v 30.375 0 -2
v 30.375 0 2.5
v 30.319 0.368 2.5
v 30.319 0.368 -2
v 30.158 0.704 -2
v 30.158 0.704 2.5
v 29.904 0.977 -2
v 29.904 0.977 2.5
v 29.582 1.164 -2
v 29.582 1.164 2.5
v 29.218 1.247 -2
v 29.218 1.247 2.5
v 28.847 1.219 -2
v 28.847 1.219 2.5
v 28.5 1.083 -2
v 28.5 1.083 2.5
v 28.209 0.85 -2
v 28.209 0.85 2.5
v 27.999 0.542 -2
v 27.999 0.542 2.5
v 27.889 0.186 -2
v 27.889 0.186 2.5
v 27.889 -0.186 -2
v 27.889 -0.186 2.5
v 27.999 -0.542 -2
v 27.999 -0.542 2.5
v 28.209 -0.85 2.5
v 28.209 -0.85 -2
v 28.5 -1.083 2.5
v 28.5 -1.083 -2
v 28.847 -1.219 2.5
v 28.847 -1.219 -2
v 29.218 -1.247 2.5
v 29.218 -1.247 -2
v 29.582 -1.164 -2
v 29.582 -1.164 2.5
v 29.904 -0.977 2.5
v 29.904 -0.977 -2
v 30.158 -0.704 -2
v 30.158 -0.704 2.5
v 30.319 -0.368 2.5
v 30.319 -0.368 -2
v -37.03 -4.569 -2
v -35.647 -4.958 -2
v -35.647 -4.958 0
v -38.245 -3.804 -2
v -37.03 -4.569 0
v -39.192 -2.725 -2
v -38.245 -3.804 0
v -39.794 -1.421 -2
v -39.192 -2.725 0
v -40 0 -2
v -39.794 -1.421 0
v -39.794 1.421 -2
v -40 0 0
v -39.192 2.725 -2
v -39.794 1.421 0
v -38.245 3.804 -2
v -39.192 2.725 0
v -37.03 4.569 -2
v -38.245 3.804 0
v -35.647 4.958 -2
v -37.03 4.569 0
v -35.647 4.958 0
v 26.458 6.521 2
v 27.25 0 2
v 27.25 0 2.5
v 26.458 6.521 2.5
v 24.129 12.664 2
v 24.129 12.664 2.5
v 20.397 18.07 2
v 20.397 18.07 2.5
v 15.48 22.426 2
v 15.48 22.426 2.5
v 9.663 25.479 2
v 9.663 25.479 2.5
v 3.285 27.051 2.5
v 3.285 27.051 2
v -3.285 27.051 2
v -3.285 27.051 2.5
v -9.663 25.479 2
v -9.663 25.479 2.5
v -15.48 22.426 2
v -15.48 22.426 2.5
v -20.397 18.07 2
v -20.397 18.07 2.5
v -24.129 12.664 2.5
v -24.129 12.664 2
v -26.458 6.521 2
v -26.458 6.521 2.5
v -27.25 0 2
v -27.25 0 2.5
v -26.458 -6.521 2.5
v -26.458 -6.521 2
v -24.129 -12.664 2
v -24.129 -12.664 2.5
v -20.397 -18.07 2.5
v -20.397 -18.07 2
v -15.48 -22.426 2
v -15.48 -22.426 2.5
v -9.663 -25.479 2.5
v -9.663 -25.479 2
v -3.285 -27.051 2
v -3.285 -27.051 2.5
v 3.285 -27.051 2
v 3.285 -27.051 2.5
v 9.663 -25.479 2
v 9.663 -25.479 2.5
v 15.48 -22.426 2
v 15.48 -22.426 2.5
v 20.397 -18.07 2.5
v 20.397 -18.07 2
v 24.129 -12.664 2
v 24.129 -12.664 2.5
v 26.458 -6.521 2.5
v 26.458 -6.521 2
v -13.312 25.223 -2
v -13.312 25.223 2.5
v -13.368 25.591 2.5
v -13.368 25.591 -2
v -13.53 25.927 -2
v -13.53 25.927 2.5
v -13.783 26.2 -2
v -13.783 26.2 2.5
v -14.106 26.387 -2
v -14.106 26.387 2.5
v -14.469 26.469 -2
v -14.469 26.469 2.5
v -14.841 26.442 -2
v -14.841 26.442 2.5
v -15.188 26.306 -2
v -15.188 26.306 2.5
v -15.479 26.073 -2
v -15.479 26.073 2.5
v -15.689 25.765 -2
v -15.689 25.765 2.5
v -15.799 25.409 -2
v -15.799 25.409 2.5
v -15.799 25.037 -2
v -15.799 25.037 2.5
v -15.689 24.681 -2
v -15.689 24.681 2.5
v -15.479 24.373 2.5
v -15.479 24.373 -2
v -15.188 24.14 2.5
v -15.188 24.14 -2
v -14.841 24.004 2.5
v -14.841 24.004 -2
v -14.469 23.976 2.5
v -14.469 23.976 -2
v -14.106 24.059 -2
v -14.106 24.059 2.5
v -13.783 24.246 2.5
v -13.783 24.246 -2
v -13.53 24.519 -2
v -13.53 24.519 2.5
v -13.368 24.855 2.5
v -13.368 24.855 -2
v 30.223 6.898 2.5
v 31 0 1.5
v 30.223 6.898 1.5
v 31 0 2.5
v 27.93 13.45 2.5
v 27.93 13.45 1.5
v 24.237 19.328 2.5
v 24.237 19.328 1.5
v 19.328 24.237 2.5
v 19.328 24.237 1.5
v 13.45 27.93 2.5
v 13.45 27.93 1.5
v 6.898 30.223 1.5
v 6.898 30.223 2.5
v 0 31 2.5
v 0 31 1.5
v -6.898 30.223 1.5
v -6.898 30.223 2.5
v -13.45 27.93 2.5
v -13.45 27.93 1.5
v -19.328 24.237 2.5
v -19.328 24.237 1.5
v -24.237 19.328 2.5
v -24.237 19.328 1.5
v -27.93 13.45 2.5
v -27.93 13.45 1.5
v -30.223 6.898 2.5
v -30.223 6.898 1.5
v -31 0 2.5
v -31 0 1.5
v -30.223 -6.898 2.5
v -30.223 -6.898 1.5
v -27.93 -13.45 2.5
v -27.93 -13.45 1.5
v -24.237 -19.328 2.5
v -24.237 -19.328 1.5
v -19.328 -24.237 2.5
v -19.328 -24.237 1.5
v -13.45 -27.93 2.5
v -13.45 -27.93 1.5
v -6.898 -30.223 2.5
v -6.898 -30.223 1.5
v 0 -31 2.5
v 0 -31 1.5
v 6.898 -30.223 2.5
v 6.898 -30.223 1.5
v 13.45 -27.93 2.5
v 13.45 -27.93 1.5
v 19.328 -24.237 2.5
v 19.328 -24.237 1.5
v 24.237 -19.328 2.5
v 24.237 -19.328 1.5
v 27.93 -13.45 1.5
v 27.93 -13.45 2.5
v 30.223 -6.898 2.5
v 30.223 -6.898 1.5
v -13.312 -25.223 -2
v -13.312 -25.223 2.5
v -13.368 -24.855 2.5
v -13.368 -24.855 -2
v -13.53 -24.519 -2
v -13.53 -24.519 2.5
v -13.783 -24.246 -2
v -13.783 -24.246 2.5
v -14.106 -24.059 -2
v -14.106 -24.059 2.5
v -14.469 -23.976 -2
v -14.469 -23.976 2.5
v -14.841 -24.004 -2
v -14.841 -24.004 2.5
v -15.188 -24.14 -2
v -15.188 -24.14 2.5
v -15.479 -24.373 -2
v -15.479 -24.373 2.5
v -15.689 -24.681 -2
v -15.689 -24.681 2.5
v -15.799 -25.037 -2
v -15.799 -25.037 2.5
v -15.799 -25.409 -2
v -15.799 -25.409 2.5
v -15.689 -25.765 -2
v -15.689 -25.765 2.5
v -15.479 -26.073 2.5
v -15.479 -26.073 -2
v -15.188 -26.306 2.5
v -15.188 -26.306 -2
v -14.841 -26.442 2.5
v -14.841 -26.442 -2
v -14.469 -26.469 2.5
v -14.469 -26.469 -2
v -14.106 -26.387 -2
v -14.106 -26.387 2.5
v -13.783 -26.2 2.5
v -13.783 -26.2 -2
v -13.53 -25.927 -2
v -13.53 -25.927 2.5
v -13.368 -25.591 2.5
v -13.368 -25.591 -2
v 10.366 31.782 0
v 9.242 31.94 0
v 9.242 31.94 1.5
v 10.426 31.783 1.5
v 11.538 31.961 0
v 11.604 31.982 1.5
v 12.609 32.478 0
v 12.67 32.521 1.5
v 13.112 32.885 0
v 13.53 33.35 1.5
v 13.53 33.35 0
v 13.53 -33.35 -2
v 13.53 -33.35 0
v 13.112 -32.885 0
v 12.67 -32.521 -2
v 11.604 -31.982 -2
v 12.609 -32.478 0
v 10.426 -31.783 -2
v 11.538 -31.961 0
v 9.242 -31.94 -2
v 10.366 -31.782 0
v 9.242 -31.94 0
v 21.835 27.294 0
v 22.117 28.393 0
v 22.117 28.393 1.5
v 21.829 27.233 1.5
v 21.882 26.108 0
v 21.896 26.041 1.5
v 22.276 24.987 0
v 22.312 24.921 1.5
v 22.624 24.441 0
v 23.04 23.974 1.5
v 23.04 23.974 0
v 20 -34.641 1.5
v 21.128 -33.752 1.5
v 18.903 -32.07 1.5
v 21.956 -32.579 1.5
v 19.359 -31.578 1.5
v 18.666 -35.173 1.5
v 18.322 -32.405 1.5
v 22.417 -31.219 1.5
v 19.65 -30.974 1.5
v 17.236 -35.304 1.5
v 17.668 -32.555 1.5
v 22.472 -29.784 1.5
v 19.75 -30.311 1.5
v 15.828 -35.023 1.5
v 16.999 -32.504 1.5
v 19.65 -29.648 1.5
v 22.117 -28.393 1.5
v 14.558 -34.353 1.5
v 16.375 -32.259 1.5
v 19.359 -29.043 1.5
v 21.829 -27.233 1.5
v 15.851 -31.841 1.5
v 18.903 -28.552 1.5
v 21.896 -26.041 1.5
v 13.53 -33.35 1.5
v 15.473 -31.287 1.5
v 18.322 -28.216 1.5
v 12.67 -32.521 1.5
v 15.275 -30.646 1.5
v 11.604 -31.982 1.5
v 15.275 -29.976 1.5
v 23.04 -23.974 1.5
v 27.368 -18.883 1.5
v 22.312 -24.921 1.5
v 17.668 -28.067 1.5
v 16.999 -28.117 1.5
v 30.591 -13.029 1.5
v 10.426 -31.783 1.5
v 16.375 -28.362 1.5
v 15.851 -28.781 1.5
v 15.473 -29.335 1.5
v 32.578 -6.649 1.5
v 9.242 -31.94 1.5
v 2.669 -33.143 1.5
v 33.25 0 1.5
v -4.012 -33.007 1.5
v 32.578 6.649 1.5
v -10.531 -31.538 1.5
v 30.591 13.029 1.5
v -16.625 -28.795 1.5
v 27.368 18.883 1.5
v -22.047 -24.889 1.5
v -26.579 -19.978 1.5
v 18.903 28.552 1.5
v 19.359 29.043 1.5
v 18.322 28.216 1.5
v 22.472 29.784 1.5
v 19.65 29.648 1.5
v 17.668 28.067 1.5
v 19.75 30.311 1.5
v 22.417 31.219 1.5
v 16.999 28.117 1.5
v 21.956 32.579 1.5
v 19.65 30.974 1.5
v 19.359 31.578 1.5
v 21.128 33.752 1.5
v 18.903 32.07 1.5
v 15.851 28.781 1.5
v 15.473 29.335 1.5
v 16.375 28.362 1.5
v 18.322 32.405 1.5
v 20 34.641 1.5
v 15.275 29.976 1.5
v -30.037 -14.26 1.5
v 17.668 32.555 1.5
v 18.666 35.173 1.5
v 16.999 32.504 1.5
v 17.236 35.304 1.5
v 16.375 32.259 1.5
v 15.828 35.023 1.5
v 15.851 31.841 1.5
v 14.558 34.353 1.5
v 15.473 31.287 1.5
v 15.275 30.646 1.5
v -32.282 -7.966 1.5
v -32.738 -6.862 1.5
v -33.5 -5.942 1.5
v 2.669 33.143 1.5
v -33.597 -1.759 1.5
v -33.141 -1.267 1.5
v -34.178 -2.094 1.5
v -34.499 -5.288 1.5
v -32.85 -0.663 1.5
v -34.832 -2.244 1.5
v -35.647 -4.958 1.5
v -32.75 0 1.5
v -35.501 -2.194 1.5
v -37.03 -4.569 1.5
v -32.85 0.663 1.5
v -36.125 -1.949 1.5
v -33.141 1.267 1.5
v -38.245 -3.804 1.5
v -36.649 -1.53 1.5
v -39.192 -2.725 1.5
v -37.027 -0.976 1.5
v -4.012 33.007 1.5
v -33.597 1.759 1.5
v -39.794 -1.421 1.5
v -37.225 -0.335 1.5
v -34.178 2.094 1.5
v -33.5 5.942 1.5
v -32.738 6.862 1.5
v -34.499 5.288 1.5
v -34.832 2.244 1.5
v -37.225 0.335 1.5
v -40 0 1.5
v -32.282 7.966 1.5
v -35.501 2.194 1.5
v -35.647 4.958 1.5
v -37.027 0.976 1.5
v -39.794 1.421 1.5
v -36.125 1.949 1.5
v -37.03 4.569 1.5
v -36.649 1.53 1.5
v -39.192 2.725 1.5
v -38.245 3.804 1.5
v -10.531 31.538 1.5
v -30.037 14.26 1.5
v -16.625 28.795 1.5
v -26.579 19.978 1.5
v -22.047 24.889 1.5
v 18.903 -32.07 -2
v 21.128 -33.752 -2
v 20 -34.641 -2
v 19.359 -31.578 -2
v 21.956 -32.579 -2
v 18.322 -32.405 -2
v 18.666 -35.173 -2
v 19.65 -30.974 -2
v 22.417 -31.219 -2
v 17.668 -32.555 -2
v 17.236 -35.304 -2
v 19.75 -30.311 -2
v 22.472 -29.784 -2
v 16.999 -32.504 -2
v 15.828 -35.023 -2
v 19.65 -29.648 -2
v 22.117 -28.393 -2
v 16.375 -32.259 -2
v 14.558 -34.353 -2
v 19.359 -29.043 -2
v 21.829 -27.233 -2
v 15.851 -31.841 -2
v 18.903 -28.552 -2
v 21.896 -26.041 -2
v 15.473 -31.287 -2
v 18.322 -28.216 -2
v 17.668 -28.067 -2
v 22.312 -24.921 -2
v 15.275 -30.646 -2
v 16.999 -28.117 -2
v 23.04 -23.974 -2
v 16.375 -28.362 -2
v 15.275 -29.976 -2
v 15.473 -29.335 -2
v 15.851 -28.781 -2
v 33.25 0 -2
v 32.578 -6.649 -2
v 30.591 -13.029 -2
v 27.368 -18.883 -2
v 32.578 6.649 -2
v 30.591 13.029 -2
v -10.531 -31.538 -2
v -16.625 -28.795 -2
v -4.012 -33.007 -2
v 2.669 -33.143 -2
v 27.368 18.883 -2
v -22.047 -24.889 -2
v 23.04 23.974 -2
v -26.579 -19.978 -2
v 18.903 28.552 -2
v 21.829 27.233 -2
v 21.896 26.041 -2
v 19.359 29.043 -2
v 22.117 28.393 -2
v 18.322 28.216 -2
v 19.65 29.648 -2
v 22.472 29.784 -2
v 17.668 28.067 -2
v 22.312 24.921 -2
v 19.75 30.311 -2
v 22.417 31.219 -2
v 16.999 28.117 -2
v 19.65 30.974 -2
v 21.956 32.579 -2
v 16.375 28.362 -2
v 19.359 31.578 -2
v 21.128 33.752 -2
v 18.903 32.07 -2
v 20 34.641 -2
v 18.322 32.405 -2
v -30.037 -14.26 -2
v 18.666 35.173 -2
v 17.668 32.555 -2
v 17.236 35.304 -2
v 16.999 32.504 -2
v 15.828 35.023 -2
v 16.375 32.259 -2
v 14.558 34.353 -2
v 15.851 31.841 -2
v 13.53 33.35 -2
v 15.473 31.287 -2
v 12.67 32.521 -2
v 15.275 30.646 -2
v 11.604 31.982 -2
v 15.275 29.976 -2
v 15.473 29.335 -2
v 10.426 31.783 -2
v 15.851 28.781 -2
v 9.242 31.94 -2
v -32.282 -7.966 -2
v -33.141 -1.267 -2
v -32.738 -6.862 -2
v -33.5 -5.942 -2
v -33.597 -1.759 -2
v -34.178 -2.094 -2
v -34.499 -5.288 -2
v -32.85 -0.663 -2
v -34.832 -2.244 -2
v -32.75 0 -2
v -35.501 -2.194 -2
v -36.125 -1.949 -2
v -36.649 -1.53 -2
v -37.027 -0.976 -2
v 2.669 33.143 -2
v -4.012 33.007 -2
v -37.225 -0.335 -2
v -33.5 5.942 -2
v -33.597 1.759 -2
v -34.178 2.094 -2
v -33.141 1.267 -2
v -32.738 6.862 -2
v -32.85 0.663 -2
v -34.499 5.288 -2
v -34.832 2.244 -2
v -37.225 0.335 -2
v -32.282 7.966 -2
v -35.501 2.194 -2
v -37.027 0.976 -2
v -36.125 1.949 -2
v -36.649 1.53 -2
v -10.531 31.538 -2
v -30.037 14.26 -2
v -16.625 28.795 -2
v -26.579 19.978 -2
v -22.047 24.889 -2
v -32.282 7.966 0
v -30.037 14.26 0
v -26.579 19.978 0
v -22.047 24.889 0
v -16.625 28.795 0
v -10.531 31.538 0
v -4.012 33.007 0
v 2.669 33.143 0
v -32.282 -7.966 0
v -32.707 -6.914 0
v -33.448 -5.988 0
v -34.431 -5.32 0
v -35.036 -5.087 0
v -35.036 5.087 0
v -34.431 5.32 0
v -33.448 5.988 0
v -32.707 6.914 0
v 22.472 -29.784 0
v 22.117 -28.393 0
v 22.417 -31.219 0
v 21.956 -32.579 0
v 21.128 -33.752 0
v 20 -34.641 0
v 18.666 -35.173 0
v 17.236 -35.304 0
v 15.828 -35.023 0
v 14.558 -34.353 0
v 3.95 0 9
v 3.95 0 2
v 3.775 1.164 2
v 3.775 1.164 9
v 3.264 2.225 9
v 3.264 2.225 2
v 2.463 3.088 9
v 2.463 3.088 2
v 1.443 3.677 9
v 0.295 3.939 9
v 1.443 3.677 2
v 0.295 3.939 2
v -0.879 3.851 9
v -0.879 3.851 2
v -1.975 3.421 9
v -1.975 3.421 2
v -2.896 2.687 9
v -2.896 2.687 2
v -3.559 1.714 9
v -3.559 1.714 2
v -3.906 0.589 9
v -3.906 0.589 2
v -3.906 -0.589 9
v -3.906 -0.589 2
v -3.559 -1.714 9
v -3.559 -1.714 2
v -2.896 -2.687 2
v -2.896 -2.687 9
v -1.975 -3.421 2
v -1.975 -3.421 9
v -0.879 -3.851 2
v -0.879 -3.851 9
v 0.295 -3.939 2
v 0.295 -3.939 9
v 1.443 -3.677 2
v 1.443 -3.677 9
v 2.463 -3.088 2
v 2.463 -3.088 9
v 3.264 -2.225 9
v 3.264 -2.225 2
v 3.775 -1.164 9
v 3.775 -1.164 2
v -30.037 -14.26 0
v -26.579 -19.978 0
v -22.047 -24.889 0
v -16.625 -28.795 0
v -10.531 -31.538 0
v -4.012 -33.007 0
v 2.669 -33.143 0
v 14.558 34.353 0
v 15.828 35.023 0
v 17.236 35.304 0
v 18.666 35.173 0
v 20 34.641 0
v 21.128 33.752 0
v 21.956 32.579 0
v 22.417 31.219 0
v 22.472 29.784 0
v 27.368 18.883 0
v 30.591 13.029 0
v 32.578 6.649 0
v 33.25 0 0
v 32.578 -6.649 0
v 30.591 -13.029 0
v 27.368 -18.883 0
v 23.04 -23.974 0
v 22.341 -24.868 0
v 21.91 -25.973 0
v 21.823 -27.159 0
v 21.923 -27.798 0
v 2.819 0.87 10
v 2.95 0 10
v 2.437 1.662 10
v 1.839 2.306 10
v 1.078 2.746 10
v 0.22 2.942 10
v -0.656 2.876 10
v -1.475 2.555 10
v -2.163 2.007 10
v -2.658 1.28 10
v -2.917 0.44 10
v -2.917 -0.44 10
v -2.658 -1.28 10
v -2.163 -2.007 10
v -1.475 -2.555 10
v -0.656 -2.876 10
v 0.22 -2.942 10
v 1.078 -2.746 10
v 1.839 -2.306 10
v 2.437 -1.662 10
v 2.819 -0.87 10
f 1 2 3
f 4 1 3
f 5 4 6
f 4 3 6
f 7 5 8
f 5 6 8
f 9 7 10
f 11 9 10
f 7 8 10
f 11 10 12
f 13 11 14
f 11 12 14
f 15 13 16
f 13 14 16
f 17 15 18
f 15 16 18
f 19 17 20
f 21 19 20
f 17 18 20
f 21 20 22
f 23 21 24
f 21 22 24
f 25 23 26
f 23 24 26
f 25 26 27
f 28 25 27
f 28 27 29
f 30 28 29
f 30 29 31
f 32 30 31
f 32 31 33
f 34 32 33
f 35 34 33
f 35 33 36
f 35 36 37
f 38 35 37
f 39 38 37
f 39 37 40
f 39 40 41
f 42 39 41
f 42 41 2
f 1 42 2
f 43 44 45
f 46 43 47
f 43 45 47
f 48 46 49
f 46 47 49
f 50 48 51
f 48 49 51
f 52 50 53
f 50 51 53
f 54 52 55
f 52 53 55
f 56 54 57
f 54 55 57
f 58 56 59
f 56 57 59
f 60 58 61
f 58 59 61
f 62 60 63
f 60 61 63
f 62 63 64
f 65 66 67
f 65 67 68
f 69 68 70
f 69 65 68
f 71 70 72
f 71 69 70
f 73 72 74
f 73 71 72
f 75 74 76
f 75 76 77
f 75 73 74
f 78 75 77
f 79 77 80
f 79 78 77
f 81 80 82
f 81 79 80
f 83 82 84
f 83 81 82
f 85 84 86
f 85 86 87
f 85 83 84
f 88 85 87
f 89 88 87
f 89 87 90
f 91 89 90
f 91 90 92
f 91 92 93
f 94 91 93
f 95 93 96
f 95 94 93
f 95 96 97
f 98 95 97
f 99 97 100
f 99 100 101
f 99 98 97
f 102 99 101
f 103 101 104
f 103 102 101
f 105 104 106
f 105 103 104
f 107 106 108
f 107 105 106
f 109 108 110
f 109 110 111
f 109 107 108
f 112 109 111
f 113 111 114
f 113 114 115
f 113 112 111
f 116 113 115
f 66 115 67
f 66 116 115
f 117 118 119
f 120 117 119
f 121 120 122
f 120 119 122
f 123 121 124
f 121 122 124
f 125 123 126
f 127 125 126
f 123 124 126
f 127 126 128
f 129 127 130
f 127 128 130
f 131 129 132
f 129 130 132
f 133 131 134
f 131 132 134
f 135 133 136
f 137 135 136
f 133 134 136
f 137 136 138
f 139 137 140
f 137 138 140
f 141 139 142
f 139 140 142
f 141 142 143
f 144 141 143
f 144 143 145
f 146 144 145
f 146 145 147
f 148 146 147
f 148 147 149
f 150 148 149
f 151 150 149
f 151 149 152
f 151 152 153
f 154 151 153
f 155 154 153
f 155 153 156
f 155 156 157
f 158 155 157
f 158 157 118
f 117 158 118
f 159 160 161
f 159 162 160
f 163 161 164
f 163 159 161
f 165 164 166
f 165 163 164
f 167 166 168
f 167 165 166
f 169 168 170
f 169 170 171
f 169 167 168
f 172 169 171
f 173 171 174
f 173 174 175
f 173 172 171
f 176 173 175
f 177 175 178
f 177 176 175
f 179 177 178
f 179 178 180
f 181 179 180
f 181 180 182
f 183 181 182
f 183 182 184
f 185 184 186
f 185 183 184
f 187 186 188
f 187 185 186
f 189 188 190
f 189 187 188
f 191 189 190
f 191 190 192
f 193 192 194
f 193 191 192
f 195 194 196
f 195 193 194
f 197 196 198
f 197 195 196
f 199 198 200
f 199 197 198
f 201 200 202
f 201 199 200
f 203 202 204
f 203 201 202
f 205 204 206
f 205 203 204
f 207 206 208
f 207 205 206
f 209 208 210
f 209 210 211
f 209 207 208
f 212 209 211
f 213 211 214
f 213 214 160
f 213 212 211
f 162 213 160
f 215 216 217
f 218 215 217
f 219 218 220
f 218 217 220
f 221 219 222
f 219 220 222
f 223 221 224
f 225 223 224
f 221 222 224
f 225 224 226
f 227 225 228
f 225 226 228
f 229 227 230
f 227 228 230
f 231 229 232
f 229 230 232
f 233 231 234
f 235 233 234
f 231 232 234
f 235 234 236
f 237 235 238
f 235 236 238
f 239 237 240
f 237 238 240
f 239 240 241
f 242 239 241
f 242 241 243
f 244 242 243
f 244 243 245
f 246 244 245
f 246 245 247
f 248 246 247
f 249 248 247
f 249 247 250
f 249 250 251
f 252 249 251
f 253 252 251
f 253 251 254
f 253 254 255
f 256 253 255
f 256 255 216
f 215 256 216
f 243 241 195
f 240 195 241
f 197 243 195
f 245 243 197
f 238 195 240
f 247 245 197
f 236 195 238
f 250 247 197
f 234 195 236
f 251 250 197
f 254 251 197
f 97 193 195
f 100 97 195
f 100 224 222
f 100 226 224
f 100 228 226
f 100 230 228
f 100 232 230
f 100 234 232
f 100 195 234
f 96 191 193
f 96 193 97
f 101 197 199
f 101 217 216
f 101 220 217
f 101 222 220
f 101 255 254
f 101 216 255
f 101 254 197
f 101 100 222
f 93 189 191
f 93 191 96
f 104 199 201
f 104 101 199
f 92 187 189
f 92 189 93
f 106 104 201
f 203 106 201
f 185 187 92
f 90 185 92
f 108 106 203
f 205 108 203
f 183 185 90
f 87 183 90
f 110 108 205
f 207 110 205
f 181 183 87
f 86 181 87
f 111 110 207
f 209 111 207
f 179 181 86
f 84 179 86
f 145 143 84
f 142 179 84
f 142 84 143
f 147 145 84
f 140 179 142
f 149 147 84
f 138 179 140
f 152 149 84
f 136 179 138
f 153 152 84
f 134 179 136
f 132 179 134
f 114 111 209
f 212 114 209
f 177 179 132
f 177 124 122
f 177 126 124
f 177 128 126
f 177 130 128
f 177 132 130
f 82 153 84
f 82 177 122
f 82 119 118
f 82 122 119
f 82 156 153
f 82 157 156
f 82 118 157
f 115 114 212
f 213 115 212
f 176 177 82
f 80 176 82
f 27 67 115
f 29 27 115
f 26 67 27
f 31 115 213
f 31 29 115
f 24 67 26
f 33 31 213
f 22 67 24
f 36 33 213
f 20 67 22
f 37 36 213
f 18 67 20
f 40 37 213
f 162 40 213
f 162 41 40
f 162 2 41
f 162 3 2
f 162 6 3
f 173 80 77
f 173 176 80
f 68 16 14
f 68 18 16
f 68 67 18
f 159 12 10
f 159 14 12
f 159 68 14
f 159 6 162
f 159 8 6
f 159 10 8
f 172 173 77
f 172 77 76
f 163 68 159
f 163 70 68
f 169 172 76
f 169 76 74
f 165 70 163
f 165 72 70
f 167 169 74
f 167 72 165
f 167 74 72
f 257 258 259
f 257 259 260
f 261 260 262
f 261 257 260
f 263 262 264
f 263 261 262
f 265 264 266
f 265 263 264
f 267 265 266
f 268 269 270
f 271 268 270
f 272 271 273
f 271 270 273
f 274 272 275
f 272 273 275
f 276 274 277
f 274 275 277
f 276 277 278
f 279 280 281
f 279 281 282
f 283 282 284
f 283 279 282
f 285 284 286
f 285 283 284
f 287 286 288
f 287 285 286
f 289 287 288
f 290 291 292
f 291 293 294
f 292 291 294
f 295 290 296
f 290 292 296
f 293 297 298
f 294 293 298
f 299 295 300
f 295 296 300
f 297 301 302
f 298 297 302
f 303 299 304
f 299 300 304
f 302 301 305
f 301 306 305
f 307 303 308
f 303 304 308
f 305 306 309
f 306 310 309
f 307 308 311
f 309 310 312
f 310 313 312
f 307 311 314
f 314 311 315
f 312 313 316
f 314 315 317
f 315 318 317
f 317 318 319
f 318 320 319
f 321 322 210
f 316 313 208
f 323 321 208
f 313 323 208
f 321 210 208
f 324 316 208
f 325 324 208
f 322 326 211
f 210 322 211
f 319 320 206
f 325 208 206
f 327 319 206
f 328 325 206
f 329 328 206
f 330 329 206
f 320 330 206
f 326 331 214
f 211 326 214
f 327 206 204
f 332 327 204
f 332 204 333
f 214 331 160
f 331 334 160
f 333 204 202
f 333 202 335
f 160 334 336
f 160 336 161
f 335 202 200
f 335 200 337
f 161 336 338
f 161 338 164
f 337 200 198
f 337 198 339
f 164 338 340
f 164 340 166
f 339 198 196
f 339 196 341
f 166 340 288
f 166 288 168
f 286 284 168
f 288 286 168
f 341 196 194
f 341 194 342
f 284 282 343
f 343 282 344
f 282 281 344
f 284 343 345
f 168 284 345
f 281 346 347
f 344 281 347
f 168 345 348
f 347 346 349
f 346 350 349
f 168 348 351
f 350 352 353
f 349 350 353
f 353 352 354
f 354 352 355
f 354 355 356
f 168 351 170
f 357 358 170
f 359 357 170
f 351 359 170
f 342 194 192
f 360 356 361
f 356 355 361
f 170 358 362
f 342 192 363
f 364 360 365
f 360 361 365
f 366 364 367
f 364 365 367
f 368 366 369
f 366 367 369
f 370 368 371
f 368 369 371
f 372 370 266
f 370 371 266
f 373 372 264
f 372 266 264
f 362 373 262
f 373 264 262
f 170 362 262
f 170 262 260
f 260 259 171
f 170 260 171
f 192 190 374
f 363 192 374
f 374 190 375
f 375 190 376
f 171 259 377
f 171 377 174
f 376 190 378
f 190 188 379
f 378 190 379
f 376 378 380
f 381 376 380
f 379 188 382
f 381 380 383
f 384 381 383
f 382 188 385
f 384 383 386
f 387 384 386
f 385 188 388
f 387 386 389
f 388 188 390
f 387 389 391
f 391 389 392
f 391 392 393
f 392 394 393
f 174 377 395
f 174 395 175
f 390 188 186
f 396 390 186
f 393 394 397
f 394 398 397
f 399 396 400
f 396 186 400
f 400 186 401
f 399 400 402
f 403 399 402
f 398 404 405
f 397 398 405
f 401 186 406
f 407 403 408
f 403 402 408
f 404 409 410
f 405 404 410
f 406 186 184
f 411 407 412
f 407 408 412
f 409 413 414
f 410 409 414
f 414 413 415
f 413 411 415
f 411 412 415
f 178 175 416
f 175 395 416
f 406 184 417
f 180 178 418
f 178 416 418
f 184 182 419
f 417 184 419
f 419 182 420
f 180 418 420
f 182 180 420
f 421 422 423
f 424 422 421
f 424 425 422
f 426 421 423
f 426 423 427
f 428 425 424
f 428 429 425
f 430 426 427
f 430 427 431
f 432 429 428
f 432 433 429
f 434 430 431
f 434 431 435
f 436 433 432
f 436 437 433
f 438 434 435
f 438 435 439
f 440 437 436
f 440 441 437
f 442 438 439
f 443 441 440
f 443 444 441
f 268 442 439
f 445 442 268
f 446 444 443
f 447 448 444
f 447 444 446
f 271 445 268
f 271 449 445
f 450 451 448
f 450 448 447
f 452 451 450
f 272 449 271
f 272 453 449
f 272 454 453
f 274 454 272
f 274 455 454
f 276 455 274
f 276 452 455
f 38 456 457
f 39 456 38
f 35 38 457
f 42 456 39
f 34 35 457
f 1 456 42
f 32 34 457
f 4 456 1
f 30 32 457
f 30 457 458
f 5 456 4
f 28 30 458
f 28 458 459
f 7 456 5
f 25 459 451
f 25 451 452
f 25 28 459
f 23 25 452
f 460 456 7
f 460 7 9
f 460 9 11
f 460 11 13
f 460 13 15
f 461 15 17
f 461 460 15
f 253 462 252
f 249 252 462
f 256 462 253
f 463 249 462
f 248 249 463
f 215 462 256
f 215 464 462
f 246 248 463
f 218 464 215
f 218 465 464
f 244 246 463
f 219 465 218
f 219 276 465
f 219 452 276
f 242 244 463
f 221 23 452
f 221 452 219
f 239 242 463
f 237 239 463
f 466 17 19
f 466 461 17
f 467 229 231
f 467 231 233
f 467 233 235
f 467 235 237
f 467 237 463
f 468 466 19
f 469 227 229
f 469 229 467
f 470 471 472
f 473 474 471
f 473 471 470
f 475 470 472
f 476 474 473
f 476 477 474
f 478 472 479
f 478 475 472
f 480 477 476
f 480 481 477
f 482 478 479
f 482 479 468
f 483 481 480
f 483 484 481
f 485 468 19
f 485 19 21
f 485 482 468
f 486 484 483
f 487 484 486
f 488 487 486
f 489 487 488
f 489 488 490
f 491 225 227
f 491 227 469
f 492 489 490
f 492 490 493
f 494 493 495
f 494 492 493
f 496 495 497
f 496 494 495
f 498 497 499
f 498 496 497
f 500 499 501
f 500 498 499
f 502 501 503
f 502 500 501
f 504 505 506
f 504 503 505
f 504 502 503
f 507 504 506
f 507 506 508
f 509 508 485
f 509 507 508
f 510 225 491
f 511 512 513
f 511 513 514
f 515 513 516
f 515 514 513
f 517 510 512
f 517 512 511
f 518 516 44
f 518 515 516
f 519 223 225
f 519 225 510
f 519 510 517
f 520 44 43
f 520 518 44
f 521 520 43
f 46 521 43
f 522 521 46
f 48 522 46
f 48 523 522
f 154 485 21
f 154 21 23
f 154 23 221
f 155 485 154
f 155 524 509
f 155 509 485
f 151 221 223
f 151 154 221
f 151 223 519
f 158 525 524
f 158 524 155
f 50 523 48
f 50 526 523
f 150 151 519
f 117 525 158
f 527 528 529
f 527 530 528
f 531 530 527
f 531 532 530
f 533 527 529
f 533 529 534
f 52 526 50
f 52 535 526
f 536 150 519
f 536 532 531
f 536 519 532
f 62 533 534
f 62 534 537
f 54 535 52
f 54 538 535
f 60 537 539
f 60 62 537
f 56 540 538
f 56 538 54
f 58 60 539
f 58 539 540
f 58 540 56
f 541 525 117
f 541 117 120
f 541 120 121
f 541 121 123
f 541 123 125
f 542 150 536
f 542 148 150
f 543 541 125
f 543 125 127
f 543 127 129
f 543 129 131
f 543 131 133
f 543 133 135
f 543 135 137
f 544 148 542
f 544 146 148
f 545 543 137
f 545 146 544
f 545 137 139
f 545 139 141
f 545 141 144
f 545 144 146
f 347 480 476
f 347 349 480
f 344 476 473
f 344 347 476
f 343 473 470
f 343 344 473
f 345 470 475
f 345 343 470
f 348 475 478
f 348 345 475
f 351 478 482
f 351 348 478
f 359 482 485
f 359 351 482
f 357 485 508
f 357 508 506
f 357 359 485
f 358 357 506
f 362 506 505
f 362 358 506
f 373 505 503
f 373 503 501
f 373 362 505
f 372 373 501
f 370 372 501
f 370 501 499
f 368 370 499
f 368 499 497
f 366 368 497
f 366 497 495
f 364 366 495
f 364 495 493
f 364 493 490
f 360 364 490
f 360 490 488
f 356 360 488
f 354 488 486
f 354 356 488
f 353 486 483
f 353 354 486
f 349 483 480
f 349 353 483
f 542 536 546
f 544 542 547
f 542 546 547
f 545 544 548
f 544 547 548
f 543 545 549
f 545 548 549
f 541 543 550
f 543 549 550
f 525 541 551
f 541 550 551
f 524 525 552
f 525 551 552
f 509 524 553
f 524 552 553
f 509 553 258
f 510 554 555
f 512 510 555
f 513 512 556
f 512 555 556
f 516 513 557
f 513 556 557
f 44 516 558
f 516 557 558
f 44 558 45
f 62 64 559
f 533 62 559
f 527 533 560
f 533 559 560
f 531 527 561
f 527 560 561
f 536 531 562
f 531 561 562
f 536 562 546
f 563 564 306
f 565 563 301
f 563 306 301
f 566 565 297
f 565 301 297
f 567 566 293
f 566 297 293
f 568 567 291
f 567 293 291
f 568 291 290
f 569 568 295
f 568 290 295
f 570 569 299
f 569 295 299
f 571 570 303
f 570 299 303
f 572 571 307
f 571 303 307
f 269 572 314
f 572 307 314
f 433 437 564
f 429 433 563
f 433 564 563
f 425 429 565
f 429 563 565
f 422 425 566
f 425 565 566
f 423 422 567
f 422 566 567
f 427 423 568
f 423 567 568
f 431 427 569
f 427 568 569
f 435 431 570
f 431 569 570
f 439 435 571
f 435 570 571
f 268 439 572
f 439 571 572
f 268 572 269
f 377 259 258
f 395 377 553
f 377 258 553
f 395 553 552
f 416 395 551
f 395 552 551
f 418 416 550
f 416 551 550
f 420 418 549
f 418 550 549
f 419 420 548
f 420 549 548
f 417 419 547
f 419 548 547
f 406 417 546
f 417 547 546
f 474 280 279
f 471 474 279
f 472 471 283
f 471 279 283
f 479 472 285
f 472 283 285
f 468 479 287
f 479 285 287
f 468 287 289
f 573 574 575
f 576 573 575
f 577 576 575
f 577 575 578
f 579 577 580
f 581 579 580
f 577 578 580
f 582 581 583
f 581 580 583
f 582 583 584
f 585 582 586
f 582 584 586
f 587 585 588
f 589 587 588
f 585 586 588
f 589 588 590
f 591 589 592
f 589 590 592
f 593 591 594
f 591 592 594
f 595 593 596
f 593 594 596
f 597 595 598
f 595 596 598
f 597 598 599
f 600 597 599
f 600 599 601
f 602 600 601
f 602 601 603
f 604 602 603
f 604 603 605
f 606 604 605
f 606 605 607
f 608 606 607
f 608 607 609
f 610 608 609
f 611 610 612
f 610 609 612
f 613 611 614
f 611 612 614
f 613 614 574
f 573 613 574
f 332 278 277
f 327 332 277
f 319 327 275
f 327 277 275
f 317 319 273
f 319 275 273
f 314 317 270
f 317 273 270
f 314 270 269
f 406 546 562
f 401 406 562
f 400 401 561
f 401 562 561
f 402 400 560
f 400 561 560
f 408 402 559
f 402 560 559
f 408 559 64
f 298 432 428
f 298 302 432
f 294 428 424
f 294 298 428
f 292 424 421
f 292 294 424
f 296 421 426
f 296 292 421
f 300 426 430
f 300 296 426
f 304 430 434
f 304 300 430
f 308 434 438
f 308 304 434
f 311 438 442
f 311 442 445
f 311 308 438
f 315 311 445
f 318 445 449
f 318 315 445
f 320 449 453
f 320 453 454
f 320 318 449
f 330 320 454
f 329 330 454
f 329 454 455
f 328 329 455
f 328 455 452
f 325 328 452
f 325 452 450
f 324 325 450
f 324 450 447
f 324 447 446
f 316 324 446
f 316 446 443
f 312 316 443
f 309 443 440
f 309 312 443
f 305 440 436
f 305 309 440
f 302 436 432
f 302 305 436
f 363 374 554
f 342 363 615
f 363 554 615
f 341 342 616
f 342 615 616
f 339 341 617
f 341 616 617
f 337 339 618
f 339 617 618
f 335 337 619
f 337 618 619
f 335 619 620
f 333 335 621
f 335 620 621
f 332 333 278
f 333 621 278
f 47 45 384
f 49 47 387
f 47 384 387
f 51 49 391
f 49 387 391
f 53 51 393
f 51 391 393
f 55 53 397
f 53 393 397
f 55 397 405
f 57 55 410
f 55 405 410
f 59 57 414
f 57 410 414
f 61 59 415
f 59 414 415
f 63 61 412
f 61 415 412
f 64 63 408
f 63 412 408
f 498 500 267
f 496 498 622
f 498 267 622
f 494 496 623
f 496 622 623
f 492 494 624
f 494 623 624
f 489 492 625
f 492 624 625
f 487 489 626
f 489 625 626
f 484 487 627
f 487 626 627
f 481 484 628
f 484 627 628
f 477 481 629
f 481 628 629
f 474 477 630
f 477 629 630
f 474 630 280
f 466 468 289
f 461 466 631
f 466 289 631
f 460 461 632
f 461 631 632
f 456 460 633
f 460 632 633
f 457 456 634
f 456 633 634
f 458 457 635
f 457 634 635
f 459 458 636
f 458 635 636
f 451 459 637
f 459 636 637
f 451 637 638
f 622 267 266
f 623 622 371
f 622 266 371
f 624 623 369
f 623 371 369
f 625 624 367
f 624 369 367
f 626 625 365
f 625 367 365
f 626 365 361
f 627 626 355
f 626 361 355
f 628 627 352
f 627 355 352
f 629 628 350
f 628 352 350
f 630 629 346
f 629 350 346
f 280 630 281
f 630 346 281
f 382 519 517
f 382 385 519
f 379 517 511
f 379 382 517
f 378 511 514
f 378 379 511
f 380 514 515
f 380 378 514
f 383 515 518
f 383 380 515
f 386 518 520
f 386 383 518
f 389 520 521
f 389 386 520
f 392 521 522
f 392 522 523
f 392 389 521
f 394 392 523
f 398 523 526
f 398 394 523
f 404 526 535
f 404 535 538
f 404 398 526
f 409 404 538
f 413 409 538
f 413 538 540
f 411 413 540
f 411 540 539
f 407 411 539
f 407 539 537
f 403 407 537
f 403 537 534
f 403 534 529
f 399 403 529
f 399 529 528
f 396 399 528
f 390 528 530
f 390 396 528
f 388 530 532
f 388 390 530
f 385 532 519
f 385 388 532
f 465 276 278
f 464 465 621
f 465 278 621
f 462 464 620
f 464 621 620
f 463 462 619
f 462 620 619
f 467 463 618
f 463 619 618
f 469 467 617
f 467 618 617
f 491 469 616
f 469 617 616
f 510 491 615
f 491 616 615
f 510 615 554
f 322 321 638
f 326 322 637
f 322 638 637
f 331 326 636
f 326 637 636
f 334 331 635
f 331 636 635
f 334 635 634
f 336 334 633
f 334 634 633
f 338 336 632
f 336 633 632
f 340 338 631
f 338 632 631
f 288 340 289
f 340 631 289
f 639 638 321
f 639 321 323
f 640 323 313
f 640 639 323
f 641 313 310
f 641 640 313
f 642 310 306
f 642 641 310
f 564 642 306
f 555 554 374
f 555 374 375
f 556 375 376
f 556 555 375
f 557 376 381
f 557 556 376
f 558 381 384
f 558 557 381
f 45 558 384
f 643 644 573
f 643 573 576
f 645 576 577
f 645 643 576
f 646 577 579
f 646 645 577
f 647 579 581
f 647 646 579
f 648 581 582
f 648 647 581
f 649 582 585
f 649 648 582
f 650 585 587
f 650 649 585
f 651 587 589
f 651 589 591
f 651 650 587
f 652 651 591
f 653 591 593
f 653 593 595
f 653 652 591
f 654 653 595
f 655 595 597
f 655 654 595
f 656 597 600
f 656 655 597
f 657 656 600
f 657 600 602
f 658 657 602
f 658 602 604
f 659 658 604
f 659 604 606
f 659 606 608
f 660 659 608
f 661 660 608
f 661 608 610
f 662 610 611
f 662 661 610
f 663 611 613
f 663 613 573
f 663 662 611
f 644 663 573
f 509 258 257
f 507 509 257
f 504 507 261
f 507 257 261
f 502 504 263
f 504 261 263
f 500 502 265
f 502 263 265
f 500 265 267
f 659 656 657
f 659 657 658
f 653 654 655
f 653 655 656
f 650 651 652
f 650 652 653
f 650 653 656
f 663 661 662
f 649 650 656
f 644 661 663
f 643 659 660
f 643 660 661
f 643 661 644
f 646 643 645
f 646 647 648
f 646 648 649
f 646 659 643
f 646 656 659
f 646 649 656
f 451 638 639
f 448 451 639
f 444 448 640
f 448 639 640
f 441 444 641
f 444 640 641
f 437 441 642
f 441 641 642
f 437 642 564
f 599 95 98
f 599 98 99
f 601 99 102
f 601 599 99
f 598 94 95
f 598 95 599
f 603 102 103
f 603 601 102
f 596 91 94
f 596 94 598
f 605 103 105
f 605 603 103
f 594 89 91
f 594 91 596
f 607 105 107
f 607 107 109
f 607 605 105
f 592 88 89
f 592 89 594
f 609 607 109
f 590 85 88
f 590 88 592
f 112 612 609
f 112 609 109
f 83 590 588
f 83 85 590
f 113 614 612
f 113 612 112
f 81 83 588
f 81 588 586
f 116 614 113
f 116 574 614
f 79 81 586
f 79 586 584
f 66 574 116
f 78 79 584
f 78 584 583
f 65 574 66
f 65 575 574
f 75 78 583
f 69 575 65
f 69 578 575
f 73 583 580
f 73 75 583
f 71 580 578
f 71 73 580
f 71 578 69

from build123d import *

# Parameters (mm, degrees)
ESQUISSE1_R                        = 31.25
BOSS_EXTRU_1_DEPTH                 = 2
BOSS_EXTRU_2_DEPTH                 = 25.5
BOSS_EXTRU_2_DEPTH_BACK            = 2
ESQUISSE2_R                        = 33.25
ESQUISSE2_R_2                      = 31.25
ESQUISSE3_R                        = 7.95
BOSS_EXTRU_3_DEPTH                 = 7.5
ESQUISSE4_R                        = 3.95
BOSS_EXTRU_4_DEPTH                 = 8
CHANFREIN1_SIZE                    = 1
BOSS_EXTRU_5_DEPTH                 = 27.5
ESQUISSE6_R                        = 1.75
ENL_V_MAT_EXTRU_1_DEPTH            = 10
CONG_1_R                           = 4
R_P_TITION_CIRCULAIRE2_COUNT       = 3
CONG_1_OF_R_P_TITION_CIRCULAIRE2_R = 4
ENL_V_MAT_EXTRU_2_DEPTH            = 25.5
ESQUISSE8_R                        = 3.95
BOSS_EXTRU_6_DEPTH                 = 8
ESQUISSE9_R                        = 2.25
ENL_V_MAT_EXTRU_3_DEPTH            = 54.952376281
CHANFREIN2_SIZE                    = 1
ESQUISSE10_R                       = 31
ESQUISSE10_R_2                     = 27.25
BOSS_EXTRU_7_DEPTH                 = 0.5
ESQUISSE11_R                       = 31
ENL_V_MAT_EXTRU_4_DEPTH            = 0.5
ESQUISSE12_R                       = 2.25
BOSS_EXTRU_8_DEPTH                 = 2
ESQUISSE13_R                       = 1.25
ENL_V_MAT_EXTRU_5_DEPTH            = 54.88050581


with BuildPart() as part:
    # Esquisse1 → Boss.-Extru.1 (new body)
    with BuildSketch(Plane.XY):
        Circle(ESQUISSE1_R)
    extrude(amount=BOSS_EXTRU_1_DEPTH)

    # Esquisse2 → Boss.-Extru.2 (add, two sides: drawn at the far end of the back side and taken through both)
    with BuildSketch(Plane.XY.offset(2).offset(-BOSS_EXTRU_2_DEPTH_BACK)):
        Circle(ESQUISSE2_R)
        Circle(ESQUISSE2_R_2, mode=Mode.SUBTRACT)
    extrude(amount=BOSS_EXTRU_2_DEPTH + BOSS_EXTRU_2_DEPTH_BACK)

    # Esquisse3 → Boss.-Extru.3 (add)
    with BuildSketch(Plane.XY.offset(2)):
        Circle(ESQUISSE3_R)
    extrude(amount=BOSS_EXTRU_3_DEPTH)

    # Esquisse4 → Boss.-Extru.4 (add)
    with BuildSketch(Plane.XY.offset(9.5)):
        Circle(ESQUISSE4_R)
    extrude(amount=BOSS_EXTRU_4_DEPTH)

    # Chanfrein1
    chanfrein1_edges = [part.edges().sort_by_distance(p)[0] for p in [
        (-7.95, 0, 9.5),
        (-3.95, 0, 17.5),
    ]]
    chamfer(chanfrein1_edges, length=CHANFREIN1_SIZE)

    # Esquisse5 → Boss.-Extru.5 (add)
    with BuildSketch(Plane.XY.offset(27.5)):
        with BuildLine():
            ThreePointArc((-32.936607143, -4.554383594), (-40, 0), (-32.936607143, 4.554383594))
            ThreePointArc((-32.936607143, 4.554383594), (-33.25, 0), (-32.936607143, -4.554383594))
        make_face()
    boss_extru_5 = extrude(amount=-BOSS_EXTRU_5_DEPTH)

    # Esquisse6 → Enlèv. mat.-Extru.1 (cut)
    with BuildSketch(Plane.XY.offset(27.5)):
        with Locations((-35, 0)):
            Circle(ESQUISSE6_R)
    enl_v_mat_extru_1 = extrude(amount=-ENL_V_MAT_EXTRU_1_DEPTH, mode=Mode.SUBTRACT)

    # Congé1
    cong_1_edges = [part.edges().sort_by_distance(p)[0] for p in [
        (-32.936607143, 4.554383594, 13.75),
        (-32.936607143, -4.554383594, 13.75),
    ]]
    fillet(cong_1_edges, radius=CONG_1_R)

    # Répétition circulaire2: Boss.-Extru.5, Enlèv. mat.-Extru.1 ×3 about axis
    r_p_tition_circulaire2_axis = Axis((0, 0, 0), (0, 0, 1))
    add([boss_extru_5.rotate(r_p_tition_circulaire2_axis, i * 360 / R_P_TITION_CIRCULAIRE2_COUNT) for i in range(1, R_P_TITION_CIRCULAIRE2_COUNT)])
    add([enl_v_mat_extru_1.rotate(r_p_tition_circulaire2_axis, i * 360 / R_P_TITION_CIRCULAIRE2_COUNT) for i in range(1, R_P_TITION_CIRCULAIRE2_COUNT)], mode=Mode.SUBTRACT)

    # Congé1 of Répétition circulaire2
    cong_1_of_r_p_tition_circulaire2_edges = [part.edges().sort_by_distance(p)[0] for p in [
        (12.524091681, -30.801130297, 13.75),
        (20.412515462, -26.246746703, 13.75),
        (20.412515462, 26.246746703, 13.75),
        (12.524091681, 30.801130297, 13.75),
    ]]
    fillet(cong_1_of_r_p_tition_circulaire2_edges, radius=CONG_1_OF_R_P_TITION_CIRCULAIRE2_R)

    # Esquisse7 → Enlèv. mat.-Extru.2 (cut)
    with BuildSketch(Plane.XY.offset(27.5)):
        with BuildLine():
            ThreePointArc((-35.647321429, 4.957920428), (-40, 0), (-35.647321429, -4.957920428))
            ThreePointArc((-35.647321429, -4.957920428), (-33.49964623, -5.941818617), (-32.281669463, -7.965947318))
            ThreePointArc((-32.281669463, -7.965947318), (-16.625, -28.795344676), (9.242121989, -31.939719491))
            ThreePointArc((9.242121989, -31.939719491), (11.604057248, -31.982453961), (13.529975674, -33.350446148))
            ThreePointArc((13.529975674, -33.350446148), (20, -34.641016151), (22.117345755, -28.39252572))
            ThreePointArc((22.117345755, -28.39252572), (21.895588982, -26.040635345), (23.039547474, -23.973772173))
            ThreePointArc((23.039547474, -23.973772173), (33.25, 0), (23.039547474, 23.973772173))
            ThreePointArc((23.039547474, 23.973772173), (21.895588982, 26.040635345), (22.117345755, 28.39252572))
            ThreePointArc((22.117345755, 28.39252572), (20, 34.641016151), (13.529975674, 33.350446148))
            ThreePointArc((13.529975674, 33.350446148), (11.604057248, 31.982453961), (9.242121989, 31.939719491))
            ThreePointArc((9.242121989, 31.939719491), (-16.625, 28.795344676), (-32.281669463, 7.965947318))
            ThreePointArc((-32.281669463, 7.965947318), (-33.49964623, 5.941818617), (-35.647321429, 4.957920428))
        make_face()
    extrude(amount=-ENL_V_MAT_EXTRU_2_DEPTH, mode=Mode.SUBTRACT)

    # Esquisse8 → Boss.-Extru.6 (add)
    with BuildSketch(Plane.XY.offset(2)):
        Circle(ESQUISSE8_R)
    extrude(amount=BOSS_EXTRU_6_DEPTH)

    # Esquisse9 → Enlèv. mat.-Extru.3 (cut, through all)
    with BuildSketch(Plane.XY.offset(2)):
        with Locations((-35, 0)):
            Circle(ESQUISSE9_R)
        with Locations((17.5, 30.310889132)):
            Circle(ESQUISSE9_R)
        with Locations((17.5, -30.310889132)):
            Circle(ESQUISSE9_R)
    extrude(amount=-ENL_V_MAT_EXTRU_3_DEPTH, mode=Mode.SUBTRACT)

    # Chanfrein2
    chanfrein2_edges = [part.edges().sort_by_distance(p)[0] for p in [
        (-3.95, 0, 10),
    ]]
    chamfer(chanfrein2_edges, length=CHANFREIN2_SIZE)

    # Esquisse10 → Boss.-Extru.7 (add)
    with BuildSketch(Plane.XY.offset(2)):
        Circle(ESQUISSE10_R)
        Circle(ESQUISSE10_R_2, mode=Mode.SUBTRACT)
    extrude(amount=BOSS_EXTRU_7_DEPTH)

    # Esquisse11 → Enlèv. mat.-Extru.4 (cut)
    with BuildSketch(Plane.XY.offset(2)):
        with BuildLine():
            ThreePointArc((-35.647321429, 4.957920428), (-33.49964623, 5.941818617), (-32.281669463, 7.965947318))
            ThreePointArc((-32.281669463, 7.965947318), (-16.625, 28.795344676), (9.242121989, 31.939719491))
            ThreePointArc((9.242121989, 31.939719491), (11.604057248, 31.982453961), (13.529975674, 33.350446148))
            ThreePointArc((13.529975674, 33.350446148), (20, 34.641016151), (22.117345755, 28.39252572))
            ThreePointArc((22.117345755, 28.39252572), (21.895588982, 26.040635345), (23.039547474, 23.973772173))
            ThreePointArc((23.039547474, 23.973772173), (33.25, 0), (23.039547474, -23.973772173))
            ThreePointArc((23.039547474, -23.973772173), (21.895588982, -26.040635345), (22.117345755, -28.39252572))
            ThreePointArc((22.117345755, -28.39252572), (20, -34.641016151), (13.529975674, -33.350446148))
            ThreePointArc((13.529975674, -33.350446148), (11.604057248, -31.982453961), (9.242121989, -31.939719491))
            ThreePointArc((9.242121989, -31.939719491), (-16.625, -28.795344676), (-32.281669463, -7.965947318))
            ThreePointArc((-32.281669463, -7.965947318), (-33.49964623, -5.941818617), (-35.647321429, -4.957920428))
            ThreePointArc((-35.647321429, -4.957920428), (-40, 0), (-35.647321429, 4.957920428))
        make_face()
        Circle(ESQUISSE11_R, mode=Mode.SUBTRACT)
    extrude(amount=-ENL_V_MAT_EXTRU_4_DEPTH, mode=Mode.SUBTRACT)

    # Esquisse12 → Boss.-Extru.8 (add)
    with BuildSketch(Plane(origin=(0, 0, 0), x_dir=(-1, 0, 0), z_dir=(0, 0, -1))):
        with BuildLine():
            ThreePointArc((35.647321429, -4.957920428), (40, 0), (35.647321429, 4.957920428))
            ThreePointArc((35.647321429, 4.957920428), (33.49964623, 5.941818617), (32.281669463, 7.965947318))
            ThreePointArc((32.281669463, 7.965947318), (16.625, 28.795344676), (-9.242121989, 31.939719491))
            ThreePointArc((-9.242121989, 31.939719491), (-11.604057248, 31.982453961), (-13.529975674, 33.350446148))
            ThreePointArc((-13.529975674, 33.350446148), (-20, 34.641016151), (-22.117345755, 28.39252572))
            ThreePointArc((-22.117345755, 28.39252572), (-21.895588982, 26.040635345), (-23.039547474, 23.973772173))
            ThreePointArc((-23.039547474, 23.973772173), (-33.25, 0), (-23.039547474, -23.973772173))
            ThreePointArc((-23.039547474, -23.973772173), (-21.895588982, -26.040635345), (-22.117345755, -28.39252572))
            ThreePointArc((-22.117345755, -28.39252572), (-20, -34.641016151), (-13.529975674, -33.350446148))
            ThreePointArc((-13.529975674, -33.350446148), (-11.604057248, -31.982453961), (-9.242121989, -31.939719491))
            ThreePointArc((-9.242121989, -31.939719491), (16.625, -28.795344676), (32.281669463, -7.965947318))
            ThreePointArc((32.281669463, -7.965947318), (33.49964623, -5.941818617), (35.647321429, -4.957920428))
        make_face()
        with Locations(Location((35, 0, 0), (0, 0, 180))):
            Circle(ESQUISSE12_R, mode=Mode.SUBTRACT)
        with Locations(Location((-17.5, -30.310889132, 0), (0, 0, 180))):
            Circle(ESQUISSE12_R, mode=Mode.SUBTRACT)
        with Locations(Location((-17.5, 30.310889132, 0), (0, 0, 180))):
            Circle(ESQUISSE12_R, mode=Mode.SUBTRACT)
    extrude(amount=BOSS_EXTRU_8_DEPTH)

    # Esquisse13 → Enlèv. mat.-Extru.5 (cut, through all)
    with BuildSketch(Plane.XY.offset(2.5)):
        with Locations((-14.5625, 25.222989885)):
            Circle(ESQUISSE13_R)
        with Locations((29.125, 0)):
            Circle(ESQUISSE13_R)
        with Locations((-14.5625, -25.222989885)):
            Circle(ESQUISSE13_R)
    extrude(amount=-ENL_V_MAT_EXTRU_5_DEPTH, mode=Mode.SUBTRACT)


solid = part.part
